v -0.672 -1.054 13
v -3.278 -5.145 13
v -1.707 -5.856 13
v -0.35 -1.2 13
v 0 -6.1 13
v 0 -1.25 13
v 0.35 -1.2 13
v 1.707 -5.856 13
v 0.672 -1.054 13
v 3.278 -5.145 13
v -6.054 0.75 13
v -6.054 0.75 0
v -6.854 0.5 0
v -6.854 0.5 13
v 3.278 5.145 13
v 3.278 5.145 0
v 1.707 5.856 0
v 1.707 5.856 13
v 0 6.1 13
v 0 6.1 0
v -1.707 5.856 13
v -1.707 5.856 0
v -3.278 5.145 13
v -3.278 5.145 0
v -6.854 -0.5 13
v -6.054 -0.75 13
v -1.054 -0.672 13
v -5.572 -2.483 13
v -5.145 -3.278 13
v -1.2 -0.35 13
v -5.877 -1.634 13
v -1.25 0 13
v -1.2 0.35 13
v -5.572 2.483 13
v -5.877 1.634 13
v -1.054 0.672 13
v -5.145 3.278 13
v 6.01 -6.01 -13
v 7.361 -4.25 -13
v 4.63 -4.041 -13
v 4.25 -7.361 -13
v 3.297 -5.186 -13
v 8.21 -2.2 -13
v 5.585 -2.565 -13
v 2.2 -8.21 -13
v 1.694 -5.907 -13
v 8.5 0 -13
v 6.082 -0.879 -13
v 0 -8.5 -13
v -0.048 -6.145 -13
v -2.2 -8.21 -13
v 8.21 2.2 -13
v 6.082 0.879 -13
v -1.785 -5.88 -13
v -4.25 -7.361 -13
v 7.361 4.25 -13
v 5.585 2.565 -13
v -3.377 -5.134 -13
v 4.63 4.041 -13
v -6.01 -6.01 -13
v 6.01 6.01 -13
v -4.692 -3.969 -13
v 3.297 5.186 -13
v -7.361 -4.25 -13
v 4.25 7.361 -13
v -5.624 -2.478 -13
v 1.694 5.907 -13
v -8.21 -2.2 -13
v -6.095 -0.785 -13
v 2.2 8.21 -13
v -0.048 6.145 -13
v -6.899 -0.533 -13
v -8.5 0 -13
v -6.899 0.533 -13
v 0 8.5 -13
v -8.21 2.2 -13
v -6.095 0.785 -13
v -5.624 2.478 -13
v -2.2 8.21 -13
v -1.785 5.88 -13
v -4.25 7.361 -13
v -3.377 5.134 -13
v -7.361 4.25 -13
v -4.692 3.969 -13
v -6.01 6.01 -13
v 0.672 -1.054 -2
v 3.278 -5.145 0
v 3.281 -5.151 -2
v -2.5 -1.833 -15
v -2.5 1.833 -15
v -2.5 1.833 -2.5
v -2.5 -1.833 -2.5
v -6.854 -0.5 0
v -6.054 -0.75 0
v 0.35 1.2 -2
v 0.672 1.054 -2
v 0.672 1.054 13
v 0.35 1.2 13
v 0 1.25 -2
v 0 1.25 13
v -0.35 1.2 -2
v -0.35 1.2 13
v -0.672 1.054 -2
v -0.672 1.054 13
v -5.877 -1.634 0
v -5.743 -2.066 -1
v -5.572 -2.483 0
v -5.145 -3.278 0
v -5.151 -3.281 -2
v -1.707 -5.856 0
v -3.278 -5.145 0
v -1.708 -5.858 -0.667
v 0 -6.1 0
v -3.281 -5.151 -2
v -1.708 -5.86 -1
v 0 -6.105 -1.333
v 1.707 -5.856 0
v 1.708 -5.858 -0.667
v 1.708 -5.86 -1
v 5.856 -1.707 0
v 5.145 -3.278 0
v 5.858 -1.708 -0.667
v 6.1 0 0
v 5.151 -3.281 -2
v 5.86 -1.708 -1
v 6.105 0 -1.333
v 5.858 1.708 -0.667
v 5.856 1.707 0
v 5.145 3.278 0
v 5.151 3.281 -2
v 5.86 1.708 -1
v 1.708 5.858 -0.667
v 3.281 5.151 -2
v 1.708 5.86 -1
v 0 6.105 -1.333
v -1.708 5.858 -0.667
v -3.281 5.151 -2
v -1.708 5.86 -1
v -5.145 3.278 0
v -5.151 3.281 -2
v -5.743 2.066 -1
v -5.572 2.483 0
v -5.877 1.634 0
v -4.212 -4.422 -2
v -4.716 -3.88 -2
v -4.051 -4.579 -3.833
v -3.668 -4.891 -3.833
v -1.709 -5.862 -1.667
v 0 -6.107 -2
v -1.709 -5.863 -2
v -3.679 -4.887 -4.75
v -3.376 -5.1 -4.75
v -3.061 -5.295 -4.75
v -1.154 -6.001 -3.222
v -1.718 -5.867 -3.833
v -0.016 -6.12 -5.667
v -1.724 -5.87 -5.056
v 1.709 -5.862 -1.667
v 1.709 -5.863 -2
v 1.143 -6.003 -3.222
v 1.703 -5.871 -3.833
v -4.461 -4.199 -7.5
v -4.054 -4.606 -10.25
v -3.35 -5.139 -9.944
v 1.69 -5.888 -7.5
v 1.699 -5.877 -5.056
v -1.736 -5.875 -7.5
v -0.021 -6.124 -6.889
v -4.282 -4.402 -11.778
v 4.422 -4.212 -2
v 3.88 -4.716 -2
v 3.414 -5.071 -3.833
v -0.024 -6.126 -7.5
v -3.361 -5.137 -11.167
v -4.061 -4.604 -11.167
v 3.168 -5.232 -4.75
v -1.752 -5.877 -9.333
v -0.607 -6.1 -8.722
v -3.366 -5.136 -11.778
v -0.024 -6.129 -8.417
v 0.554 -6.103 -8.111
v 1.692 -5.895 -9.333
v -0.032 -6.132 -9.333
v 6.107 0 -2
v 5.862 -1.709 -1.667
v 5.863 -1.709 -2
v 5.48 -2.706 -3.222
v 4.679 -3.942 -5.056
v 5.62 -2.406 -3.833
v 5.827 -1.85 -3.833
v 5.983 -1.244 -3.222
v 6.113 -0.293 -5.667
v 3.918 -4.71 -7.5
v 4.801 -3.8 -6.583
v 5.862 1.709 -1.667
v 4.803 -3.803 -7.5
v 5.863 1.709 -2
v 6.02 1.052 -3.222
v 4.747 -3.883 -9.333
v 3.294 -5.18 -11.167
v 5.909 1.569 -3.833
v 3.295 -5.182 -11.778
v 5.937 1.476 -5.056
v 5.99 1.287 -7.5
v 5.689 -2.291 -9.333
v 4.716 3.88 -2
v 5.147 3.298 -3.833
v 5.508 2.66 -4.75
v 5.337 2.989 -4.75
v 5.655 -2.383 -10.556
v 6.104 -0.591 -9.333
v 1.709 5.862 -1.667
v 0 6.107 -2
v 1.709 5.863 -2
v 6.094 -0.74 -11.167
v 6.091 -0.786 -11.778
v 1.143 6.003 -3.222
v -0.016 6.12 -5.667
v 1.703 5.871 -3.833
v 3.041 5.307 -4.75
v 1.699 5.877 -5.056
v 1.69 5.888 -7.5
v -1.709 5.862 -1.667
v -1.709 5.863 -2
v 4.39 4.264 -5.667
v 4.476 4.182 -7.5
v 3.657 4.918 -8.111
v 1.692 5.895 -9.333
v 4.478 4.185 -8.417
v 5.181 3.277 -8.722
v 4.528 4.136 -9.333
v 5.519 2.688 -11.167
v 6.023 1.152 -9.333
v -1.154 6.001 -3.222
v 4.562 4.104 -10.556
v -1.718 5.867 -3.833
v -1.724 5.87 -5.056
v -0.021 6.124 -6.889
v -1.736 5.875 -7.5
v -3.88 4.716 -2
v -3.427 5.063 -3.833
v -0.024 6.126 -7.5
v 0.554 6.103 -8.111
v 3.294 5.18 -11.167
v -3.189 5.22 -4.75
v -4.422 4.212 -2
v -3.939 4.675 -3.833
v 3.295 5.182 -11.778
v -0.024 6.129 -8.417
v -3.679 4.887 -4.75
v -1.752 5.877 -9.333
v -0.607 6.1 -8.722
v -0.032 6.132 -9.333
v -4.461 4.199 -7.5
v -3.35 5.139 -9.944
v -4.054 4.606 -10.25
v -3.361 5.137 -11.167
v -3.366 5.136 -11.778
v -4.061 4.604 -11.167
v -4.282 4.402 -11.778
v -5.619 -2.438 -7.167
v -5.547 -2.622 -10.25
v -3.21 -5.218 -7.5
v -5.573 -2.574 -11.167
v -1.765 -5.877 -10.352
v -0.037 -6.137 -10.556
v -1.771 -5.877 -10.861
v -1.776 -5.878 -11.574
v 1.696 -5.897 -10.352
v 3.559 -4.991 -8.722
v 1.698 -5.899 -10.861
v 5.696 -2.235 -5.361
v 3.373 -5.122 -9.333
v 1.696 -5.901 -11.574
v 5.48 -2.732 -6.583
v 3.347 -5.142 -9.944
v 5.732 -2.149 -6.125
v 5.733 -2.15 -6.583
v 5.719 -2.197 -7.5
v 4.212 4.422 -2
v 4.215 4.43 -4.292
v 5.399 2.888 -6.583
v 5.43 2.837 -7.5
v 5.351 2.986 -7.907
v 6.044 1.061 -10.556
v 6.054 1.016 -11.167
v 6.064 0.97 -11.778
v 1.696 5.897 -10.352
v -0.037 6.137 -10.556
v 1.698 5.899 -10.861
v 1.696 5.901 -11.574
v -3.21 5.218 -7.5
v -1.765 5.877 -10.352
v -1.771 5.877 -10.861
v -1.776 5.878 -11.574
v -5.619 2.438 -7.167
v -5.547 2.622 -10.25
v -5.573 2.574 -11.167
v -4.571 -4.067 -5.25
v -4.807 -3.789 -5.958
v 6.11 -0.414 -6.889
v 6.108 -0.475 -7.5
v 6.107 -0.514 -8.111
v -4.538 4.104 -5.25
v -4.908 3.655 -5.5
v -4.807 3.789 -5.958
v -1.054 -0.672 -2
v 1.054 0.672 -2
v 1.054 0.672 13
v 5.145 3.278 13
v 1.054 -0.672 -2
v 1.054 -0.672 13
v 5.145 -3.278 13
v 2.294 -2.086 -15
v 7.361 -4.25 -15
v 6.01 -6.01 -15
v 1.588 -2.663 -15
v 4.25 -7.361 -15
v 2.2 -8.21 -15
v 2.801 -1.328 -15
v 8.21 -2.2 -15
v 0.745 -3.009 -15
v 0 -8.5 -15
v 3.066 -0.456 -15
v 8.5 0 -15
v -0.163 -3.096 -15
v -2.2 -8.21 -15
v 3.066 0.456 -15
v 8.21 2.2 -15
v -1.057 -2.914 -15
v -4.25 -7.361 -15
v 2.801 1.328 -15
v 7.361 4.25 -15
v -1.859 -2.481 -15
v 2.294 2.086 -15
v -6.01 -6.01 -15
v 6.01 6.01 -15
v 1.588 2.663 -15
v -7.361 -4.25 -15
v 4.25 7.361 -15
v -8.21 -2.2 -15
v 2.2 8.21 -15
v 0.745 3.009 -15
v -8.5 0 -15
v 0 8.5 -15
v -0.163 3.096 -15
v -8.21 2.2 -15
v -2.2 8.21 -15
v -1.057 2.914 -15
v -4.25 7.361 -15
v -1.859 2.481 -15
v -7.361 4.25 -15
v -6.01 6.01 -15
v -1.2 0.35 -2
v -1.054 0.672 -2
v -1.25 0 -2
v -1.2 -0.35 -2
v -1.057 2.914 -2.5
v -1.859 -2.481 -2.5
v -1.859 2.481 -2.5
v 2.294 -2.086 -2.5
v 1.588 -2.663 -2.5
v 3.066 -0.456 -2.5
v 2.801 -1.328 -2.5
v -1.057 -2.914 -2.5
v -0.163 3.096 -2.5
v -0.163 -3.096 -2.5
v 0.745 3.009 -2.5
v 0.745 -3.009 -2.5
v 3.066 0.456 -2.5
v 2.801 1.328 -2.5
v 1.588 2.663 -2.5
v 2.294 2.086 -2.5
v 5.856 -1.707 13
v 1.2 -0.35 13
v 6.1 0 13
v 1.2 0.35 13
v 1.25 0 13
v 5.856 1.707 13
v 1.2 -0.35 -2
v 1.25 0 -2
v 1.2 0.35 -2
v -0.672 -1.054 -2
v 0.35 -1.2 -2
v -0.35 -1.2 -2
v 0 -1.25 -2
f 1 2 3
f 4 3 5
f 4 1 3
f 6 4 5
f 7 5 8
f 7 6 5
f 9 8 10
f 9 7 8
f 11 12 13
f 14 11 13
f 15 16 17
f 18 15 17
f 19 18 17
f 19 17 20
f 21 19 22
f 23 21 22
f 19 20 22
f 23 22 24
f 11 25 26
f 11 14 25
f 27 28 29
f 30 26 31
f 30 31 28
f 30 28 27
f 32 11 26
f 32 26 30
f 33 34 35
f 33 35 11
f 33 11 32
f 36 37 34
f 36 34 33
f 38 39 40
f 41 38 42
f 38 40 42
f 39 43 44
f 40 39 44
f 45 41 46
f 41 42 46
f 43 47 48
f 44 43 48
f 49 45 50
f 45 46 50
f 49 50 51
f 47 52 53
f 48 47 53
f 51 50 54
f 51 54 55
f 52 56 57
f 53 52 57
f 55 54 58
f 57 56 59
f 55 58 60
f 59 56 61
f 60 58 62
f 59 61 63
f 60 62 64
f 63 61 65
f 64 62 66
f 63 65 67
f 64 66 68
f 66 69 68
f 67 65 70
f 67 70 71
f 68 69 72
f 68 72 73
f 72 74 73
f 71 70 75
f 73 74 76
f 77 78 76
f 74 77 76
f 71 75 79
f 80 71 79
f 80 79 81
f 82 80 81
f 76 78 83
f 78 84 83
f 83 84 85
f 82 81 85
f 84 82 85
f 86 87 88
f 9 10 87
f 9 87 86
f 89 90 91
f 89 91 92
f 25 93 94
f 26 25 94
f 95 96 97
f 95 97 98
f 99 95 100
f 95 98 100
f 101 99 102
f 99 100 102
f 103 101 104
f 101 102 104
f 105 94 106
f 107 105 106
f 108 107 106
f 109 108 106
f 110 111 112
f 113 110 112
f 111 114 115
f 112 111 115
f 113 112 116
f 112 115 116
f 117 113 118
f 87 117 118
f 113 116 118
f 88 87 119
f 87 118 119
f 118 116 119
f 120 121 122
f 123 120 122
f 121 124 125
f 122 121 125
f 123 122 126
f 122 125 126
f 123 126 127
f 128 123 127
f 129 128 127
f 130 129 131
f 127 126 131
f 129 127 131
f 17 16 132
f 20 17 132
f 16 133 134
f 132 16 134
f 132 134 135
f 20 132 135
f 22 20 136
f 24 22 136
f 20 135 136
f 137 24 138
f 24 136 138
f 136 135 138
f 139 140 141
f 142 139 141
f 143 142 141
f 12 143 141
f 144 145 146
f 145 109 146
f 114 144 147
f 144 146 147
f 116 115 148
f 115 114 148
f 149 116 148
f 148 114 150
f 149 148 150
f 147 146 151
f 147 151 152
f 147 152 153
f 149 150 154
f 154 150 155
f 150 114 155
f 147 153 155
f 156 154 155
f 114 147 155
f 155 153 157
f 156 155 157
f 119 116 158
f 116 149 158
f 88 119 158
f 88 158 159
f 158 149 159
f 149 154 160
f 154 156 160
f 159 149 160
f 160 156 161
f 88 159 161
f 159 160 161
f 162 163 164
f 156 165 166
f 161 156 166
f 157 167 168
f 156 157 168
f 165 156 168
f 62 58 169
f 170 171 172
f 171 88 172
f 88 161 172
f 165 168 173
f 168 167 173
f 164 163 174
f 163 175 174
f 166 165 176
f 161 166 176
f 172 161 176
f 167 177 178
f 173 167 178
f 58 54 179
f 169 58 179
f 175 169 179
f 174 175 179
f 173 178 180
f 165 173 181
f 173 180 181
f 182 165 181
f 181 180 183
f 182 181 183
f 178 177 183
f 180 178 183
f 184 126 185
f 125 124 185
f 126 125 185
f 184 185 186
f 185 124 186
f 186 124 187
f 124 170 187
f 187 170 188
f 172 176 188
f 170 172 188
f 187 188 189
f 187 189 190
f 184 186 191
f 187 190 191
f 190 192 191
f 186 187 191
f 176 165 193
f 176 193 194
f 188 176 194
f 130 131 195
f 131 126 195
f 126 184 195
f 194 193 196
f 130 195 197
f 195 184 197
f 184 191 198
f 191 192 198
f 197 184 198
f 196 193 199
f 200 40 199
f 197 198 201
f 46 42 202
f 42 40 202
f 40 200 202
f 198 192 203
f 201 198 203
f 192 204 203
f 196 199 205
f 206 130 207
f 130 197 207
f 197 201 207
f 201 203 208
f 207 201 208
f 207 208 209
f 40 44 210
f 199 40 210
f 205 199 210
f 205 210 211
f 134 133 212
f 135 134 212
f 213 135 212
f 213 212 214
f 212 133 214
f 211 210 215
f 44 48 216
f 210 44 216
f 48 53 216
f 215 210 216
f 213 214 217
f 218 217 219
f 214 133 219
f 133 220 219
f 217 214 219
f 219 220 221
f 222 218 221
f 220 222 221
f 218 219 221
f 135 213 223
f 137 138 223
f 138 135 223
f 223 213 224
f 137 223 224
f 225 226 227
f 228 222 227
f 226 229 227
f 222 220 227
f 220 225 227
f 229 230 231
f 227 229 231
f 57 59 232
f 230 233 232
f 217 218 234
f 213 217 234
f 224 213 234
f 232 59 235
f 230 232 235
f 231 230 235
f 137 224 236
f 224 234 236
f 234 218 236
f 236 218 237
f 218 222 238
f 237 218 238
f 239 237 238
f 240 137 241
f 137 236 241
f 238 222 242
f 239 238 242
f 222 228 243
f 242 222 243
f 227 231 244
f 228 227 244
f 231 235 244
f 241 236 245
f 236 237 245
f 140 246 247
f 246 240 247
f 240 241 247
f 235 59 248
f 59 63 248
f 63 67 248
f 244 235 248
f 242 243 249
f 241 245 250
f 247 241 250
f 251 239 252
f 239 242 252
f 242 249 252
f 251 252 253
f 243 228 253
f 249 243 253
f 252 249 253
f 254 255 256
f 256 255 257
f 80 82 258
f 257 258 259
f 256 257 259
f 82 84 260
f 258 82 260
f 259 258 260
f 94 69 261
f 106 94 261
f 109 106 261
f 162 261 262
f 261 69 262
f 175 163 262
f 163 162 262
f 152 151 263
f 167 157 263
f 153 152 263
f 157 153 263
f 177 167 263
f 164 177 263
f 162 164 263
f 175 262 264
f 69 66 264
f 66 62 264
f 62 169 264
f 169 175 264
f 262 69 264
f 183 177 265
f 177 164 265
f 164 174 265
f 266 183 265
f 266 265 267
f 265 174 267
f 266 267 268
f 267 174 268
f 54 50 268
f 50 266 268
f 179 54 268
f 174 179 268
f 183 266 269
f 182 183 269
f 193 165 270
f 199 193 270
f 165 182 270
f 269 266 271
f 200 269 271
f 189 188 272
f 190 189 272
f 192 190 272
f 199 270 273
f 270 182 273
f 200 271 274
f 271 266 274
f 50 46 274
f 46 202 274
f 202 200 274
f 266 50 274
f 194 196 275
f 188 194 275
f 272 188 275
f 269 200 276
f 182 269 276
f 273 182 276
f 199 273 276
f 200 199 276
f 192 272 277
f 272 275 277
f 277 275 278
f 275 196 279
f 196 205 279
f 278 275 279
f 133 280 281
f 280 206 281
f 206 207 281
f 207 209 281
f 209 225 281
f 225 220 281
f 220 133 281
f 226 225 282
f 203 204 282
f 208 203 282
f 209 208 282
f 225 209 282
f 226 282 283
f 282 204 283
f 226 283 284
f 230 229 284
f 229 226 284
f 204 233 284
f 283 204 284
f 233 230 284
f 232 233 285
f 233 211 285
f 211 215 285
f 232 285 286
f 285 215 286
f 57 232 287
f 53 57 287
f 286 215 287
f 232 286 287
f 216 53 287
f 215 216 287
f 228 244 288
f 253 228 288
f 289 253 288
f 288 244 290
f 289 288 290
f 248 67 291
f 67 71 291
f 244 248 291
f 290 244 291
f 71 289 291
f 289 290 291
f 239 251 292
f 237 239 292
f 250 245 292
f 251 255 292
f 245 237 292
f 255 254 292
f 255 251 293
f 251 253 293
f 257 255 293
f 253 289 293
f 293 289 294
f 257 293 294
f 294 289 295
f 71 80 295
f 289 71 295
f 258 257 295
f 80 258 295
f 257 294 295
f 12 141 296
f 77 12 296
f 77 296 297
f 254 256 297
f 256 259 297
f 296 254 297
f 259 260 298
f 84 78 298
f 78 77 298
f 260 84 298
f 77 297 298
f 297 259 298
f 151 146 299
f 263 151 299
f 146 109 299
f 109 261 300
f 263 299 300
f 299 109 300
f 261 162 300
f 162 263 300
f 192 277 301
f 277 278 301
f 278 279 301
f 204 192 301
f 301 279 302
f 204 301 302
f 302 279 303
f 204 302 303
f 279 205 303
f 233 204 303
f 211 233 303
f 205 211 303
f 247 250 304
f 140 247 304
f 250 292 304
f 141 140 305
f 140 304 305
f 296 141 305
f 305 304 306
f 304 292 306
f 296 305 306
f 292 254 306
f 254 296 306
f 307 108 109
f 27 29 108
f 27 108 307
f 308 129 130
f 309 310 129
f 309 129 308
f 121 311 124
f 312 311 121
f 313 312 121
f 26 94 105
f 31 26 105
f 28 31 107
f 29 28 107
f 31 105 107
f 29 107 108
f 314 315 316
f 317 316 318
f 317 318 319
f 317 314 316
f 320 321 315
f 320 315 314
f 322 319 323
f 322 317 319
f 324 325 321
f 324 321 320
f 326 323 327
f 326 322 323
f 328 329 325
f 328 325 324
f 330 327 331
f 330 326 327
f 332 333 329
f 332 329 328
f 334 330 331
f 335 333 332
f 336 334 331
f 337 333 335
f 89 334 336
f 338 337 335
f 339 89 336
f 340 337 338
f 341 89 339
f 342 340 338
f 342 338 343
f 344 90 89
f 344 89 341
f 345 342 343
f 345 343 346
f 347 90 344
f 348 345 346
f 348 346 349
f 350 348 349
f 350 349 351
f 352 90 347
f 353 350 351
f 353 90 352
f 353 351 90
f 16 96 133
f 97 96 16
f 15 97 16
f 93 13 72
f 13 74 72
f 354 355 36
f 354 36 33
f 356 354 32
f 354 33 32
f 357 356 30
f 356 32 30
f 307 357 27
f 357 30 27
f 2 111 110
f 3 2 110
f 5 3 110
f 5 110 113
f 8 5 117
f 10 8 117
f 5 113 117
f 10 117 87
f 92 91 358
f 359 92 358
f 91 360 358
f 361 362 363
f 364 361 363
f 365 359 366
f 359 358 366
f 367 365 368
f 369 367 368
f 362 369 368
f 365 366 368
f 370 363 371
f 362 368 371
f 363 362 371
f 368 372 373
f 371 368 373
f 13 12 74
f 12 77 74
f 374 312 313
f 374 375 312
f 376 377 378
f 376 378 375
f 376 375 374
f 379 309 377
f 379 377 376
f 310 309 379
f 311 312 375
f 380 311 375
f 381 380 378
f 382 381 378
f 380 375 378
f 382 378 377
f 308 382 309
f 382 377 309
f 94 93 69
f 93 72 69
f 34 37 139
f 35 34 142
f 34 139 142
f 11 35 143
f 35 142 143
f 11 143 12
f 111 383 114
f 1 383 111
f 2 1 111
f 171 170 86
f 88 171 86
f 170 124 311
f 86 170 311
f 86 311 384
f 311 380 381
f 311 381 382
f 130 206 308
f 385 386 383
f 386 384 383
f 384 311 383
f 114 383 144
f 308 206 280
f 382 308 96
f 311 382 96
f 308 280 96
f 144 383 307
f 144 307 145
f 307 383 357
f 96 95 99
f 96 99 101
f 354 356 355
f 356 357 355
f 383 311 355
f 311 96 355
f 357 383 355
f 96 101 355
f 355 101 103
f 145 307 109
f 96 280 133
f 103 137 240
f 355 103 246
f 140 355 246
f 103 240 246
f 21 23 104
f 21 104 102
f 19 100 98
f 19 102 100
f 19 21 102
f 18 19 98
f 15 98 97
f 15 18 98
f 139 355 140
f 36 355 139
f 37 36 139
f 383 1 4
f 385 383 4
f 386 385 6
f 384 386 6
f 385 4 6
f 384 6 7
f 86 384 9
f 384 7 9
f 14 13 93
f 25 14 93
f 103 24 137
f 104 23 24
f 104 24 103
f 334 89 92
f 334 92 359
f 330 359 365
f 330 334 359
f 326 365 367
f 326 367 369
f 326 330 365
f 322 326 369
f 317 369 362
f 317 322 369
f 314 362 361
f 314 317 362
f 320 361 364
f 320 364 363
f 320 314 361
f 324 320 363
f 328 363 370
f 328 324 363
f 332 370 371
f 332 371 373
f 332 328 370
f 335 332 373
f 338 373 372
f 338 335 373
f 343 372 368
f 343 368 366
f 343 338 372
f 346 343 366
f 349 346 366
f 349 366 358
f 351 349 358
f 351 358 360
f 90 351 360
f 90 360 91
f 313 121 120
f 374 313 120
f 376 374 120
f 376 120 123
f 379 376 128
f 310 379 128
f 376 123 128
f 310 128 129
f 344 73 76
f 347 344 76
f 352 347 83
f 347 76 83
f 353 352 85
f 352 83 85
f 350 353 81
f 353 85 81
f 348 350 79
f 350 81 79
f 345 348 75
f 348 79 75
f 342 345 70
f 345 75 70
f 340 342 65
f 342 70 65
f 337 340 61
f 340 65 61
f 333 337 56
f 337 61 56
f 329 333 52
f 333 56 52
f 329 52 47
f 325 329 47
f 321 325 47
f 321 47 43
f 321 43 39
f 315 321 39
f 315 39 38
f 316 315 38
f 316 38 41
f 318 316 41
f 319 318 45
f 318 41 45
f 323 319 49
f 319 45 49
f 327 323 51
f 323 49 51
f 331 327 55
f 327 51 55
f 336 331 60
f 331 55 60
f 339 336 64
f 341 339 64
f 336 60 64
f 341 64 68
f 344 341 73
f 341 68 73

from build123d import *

# Parameters (mm, degrees)
BOSS_EXTRUDE1_DEPTH           = 13
BOSS_EXTRUDE1_OTHER_WAY_DEPTH = 13
BOSS_EXTRUDE1_OTHER_WAY_TAPER = -0.2
SKETCH3_R                     = 8.5
BOSS_EXTRUDE2_DEPTH           = 2
CUT_EXTRUDE2_DEPTH            = 12.5
SKETCH2_R                     = 1.25
CUT_EXTRUDE1_DEPTH            = 15
CUT_EXTRUDE3_DEPTH            = 15


with BuildPart() as part:
    # Sketch1 → Boss-Extrude1 (new body)
    with BuildSketch(Plane.XY):
        with BuildLine():
            ThreePointArc((-6.053717866, -0.75), (6.1, 0), (-6.053717866, 0.75))
            Line((-6.053717866, 0.75), (-6.853717866, 0.5))
            Line((-6.853717866, 0.5), (-6.853717866, -0.5))
            Line((-6.853717866, -0.5), (-6.053717866, -0.75))
        make_face()
    extrude(amount=BOSS_EXTRUDE1_DEPTH)

    # Sketch1 → Boss-Extrude1 other way (add)
    with BuildSketch(Plane.XY):
        with BuildLine():
            ThreePointArc((-6.053717866, -0.75), (6.1, 0), (-6.053717866, 0.75))
            Line((-6.053717866, 0.75), (-6.853717866, 0.5))
            Line((-6.853717866, 0.5), (-6.853717866, -0.5))
            Line((-6.853717866, -0.5), (-6.053717866, -0.75))
        make_face()
    extrude(amount=-BOSS_EXTRUDE1_OTHER_WAY_DEPTH, taper=BOSS_EXTRUDE1_OTHER_WAY_TAPER)

    # Sketch3 → Boss-Extrude2 (add)
    with BuildSketch(Plane(origin=(0, 0, -13), x_dir=(-1, 0, 0), z_dir=(0, 0, -1))):
        Circle(SKETCH3_R)
    extrude(amount=BOSS_EXTRUDE2_DEPTH)

    # Sketch4 → Cut-Extrude2 (cut)
    with BuildSketch(Plane(origin=(0, 0, -15), x_dir=(-1, 0, 0), z_dir=(0, 0, -1))):
        with BuildLine():
            Line((2.5, 1.833030278), (2.5, -1.833030278))
            ThreePointArc((2.5, -1.833030278), (-3.1, 0), (2.5, 1.833030278))
        make_face()
    extrude(amount=-CUT_EXTRUDE2_DEPTH, mode=Mode.SUBTRACT)

    # Sketch2 → Cut-Extrude1 (cut)
    with BuildSketch(Plane.XY.offset(13)):
        Circle(SKETCH2_R)
    extrude(amount=-CUT_EXTRUDE1_DEPTH, mode=Mode.SUBTRACT)

    # Sketch5 → Cut-Extrude3 (cut)
    with BuildSketch(Plane.XY.offset(13)):
        with BuildLine():
            Line((-1.054239307, 0.67162451), (-5.182959865, 3.301909593))
            ThreePointArc((-5.182959865, 3.301909593), (-4.345438983, 4.345438983), (-3.301909593, 5.182959865))
            Line((-3.301909593, 5.182959865), (-0.67162451, 1.054239307))
            ThreePointArc((-0.67162451, 1.054239307), (-0.883883476, 0.883883476), (-1.054239307, 0.67162451))
        make_face()
        with BuildLine():
            Line((0.67162451, 1.054239307), (3.301909593, 5.182959865))
            ThreePointArc((3.301909593, 5.182959865), (4.345438983, 4.345438983), (5.182959865, 3.301909593))
            Line((5.182959865, 3.301909593), (1.054239307, 0.67162451))
            ThreePointArc((1.054239307, 0.67162451), (0.883883476, 0.883883476), (0.67162451, 1.054239307))
        make_face()
        with BuildLine():
            Line((1.054239307, -0.67162451), (5.182959865, -3.301909593))
            ThreePointArc((5.182959865, -3.301909593), (4.345438983, -4.345438983), (3.301909593, -5.182959865))
            Line((3.301909593, -5.182959865), (0.67162451, -1.054239307))
            ThreePointArc((0.67162451, -1.054239307), (0.883883476, -0.883883476), (1.054239307, -0.67162451))
        make_face()
        with BuildLine():
            Line((-0.67162451, -1.054239307), (-3.301909593, -5.182959865))
            ThreePointArc((-3.301909593, -5.182959865), (-4.345438983, -4.345438983), (-5.182959865, -3.301909593))
            Line((-5.182959865, -3.301909593), (-1.054239307, -0.67162451))
            ThreePointArc((-1.054239307, -0.67162451), (-0.883883476, -0.883883476), (-0.67162451, -1.054239307))
        make_face()
    extrude(amount=-CUT_EXTRUDE3_DEPTH, mode=Mode.SUBTRACT)


solid = part.part
